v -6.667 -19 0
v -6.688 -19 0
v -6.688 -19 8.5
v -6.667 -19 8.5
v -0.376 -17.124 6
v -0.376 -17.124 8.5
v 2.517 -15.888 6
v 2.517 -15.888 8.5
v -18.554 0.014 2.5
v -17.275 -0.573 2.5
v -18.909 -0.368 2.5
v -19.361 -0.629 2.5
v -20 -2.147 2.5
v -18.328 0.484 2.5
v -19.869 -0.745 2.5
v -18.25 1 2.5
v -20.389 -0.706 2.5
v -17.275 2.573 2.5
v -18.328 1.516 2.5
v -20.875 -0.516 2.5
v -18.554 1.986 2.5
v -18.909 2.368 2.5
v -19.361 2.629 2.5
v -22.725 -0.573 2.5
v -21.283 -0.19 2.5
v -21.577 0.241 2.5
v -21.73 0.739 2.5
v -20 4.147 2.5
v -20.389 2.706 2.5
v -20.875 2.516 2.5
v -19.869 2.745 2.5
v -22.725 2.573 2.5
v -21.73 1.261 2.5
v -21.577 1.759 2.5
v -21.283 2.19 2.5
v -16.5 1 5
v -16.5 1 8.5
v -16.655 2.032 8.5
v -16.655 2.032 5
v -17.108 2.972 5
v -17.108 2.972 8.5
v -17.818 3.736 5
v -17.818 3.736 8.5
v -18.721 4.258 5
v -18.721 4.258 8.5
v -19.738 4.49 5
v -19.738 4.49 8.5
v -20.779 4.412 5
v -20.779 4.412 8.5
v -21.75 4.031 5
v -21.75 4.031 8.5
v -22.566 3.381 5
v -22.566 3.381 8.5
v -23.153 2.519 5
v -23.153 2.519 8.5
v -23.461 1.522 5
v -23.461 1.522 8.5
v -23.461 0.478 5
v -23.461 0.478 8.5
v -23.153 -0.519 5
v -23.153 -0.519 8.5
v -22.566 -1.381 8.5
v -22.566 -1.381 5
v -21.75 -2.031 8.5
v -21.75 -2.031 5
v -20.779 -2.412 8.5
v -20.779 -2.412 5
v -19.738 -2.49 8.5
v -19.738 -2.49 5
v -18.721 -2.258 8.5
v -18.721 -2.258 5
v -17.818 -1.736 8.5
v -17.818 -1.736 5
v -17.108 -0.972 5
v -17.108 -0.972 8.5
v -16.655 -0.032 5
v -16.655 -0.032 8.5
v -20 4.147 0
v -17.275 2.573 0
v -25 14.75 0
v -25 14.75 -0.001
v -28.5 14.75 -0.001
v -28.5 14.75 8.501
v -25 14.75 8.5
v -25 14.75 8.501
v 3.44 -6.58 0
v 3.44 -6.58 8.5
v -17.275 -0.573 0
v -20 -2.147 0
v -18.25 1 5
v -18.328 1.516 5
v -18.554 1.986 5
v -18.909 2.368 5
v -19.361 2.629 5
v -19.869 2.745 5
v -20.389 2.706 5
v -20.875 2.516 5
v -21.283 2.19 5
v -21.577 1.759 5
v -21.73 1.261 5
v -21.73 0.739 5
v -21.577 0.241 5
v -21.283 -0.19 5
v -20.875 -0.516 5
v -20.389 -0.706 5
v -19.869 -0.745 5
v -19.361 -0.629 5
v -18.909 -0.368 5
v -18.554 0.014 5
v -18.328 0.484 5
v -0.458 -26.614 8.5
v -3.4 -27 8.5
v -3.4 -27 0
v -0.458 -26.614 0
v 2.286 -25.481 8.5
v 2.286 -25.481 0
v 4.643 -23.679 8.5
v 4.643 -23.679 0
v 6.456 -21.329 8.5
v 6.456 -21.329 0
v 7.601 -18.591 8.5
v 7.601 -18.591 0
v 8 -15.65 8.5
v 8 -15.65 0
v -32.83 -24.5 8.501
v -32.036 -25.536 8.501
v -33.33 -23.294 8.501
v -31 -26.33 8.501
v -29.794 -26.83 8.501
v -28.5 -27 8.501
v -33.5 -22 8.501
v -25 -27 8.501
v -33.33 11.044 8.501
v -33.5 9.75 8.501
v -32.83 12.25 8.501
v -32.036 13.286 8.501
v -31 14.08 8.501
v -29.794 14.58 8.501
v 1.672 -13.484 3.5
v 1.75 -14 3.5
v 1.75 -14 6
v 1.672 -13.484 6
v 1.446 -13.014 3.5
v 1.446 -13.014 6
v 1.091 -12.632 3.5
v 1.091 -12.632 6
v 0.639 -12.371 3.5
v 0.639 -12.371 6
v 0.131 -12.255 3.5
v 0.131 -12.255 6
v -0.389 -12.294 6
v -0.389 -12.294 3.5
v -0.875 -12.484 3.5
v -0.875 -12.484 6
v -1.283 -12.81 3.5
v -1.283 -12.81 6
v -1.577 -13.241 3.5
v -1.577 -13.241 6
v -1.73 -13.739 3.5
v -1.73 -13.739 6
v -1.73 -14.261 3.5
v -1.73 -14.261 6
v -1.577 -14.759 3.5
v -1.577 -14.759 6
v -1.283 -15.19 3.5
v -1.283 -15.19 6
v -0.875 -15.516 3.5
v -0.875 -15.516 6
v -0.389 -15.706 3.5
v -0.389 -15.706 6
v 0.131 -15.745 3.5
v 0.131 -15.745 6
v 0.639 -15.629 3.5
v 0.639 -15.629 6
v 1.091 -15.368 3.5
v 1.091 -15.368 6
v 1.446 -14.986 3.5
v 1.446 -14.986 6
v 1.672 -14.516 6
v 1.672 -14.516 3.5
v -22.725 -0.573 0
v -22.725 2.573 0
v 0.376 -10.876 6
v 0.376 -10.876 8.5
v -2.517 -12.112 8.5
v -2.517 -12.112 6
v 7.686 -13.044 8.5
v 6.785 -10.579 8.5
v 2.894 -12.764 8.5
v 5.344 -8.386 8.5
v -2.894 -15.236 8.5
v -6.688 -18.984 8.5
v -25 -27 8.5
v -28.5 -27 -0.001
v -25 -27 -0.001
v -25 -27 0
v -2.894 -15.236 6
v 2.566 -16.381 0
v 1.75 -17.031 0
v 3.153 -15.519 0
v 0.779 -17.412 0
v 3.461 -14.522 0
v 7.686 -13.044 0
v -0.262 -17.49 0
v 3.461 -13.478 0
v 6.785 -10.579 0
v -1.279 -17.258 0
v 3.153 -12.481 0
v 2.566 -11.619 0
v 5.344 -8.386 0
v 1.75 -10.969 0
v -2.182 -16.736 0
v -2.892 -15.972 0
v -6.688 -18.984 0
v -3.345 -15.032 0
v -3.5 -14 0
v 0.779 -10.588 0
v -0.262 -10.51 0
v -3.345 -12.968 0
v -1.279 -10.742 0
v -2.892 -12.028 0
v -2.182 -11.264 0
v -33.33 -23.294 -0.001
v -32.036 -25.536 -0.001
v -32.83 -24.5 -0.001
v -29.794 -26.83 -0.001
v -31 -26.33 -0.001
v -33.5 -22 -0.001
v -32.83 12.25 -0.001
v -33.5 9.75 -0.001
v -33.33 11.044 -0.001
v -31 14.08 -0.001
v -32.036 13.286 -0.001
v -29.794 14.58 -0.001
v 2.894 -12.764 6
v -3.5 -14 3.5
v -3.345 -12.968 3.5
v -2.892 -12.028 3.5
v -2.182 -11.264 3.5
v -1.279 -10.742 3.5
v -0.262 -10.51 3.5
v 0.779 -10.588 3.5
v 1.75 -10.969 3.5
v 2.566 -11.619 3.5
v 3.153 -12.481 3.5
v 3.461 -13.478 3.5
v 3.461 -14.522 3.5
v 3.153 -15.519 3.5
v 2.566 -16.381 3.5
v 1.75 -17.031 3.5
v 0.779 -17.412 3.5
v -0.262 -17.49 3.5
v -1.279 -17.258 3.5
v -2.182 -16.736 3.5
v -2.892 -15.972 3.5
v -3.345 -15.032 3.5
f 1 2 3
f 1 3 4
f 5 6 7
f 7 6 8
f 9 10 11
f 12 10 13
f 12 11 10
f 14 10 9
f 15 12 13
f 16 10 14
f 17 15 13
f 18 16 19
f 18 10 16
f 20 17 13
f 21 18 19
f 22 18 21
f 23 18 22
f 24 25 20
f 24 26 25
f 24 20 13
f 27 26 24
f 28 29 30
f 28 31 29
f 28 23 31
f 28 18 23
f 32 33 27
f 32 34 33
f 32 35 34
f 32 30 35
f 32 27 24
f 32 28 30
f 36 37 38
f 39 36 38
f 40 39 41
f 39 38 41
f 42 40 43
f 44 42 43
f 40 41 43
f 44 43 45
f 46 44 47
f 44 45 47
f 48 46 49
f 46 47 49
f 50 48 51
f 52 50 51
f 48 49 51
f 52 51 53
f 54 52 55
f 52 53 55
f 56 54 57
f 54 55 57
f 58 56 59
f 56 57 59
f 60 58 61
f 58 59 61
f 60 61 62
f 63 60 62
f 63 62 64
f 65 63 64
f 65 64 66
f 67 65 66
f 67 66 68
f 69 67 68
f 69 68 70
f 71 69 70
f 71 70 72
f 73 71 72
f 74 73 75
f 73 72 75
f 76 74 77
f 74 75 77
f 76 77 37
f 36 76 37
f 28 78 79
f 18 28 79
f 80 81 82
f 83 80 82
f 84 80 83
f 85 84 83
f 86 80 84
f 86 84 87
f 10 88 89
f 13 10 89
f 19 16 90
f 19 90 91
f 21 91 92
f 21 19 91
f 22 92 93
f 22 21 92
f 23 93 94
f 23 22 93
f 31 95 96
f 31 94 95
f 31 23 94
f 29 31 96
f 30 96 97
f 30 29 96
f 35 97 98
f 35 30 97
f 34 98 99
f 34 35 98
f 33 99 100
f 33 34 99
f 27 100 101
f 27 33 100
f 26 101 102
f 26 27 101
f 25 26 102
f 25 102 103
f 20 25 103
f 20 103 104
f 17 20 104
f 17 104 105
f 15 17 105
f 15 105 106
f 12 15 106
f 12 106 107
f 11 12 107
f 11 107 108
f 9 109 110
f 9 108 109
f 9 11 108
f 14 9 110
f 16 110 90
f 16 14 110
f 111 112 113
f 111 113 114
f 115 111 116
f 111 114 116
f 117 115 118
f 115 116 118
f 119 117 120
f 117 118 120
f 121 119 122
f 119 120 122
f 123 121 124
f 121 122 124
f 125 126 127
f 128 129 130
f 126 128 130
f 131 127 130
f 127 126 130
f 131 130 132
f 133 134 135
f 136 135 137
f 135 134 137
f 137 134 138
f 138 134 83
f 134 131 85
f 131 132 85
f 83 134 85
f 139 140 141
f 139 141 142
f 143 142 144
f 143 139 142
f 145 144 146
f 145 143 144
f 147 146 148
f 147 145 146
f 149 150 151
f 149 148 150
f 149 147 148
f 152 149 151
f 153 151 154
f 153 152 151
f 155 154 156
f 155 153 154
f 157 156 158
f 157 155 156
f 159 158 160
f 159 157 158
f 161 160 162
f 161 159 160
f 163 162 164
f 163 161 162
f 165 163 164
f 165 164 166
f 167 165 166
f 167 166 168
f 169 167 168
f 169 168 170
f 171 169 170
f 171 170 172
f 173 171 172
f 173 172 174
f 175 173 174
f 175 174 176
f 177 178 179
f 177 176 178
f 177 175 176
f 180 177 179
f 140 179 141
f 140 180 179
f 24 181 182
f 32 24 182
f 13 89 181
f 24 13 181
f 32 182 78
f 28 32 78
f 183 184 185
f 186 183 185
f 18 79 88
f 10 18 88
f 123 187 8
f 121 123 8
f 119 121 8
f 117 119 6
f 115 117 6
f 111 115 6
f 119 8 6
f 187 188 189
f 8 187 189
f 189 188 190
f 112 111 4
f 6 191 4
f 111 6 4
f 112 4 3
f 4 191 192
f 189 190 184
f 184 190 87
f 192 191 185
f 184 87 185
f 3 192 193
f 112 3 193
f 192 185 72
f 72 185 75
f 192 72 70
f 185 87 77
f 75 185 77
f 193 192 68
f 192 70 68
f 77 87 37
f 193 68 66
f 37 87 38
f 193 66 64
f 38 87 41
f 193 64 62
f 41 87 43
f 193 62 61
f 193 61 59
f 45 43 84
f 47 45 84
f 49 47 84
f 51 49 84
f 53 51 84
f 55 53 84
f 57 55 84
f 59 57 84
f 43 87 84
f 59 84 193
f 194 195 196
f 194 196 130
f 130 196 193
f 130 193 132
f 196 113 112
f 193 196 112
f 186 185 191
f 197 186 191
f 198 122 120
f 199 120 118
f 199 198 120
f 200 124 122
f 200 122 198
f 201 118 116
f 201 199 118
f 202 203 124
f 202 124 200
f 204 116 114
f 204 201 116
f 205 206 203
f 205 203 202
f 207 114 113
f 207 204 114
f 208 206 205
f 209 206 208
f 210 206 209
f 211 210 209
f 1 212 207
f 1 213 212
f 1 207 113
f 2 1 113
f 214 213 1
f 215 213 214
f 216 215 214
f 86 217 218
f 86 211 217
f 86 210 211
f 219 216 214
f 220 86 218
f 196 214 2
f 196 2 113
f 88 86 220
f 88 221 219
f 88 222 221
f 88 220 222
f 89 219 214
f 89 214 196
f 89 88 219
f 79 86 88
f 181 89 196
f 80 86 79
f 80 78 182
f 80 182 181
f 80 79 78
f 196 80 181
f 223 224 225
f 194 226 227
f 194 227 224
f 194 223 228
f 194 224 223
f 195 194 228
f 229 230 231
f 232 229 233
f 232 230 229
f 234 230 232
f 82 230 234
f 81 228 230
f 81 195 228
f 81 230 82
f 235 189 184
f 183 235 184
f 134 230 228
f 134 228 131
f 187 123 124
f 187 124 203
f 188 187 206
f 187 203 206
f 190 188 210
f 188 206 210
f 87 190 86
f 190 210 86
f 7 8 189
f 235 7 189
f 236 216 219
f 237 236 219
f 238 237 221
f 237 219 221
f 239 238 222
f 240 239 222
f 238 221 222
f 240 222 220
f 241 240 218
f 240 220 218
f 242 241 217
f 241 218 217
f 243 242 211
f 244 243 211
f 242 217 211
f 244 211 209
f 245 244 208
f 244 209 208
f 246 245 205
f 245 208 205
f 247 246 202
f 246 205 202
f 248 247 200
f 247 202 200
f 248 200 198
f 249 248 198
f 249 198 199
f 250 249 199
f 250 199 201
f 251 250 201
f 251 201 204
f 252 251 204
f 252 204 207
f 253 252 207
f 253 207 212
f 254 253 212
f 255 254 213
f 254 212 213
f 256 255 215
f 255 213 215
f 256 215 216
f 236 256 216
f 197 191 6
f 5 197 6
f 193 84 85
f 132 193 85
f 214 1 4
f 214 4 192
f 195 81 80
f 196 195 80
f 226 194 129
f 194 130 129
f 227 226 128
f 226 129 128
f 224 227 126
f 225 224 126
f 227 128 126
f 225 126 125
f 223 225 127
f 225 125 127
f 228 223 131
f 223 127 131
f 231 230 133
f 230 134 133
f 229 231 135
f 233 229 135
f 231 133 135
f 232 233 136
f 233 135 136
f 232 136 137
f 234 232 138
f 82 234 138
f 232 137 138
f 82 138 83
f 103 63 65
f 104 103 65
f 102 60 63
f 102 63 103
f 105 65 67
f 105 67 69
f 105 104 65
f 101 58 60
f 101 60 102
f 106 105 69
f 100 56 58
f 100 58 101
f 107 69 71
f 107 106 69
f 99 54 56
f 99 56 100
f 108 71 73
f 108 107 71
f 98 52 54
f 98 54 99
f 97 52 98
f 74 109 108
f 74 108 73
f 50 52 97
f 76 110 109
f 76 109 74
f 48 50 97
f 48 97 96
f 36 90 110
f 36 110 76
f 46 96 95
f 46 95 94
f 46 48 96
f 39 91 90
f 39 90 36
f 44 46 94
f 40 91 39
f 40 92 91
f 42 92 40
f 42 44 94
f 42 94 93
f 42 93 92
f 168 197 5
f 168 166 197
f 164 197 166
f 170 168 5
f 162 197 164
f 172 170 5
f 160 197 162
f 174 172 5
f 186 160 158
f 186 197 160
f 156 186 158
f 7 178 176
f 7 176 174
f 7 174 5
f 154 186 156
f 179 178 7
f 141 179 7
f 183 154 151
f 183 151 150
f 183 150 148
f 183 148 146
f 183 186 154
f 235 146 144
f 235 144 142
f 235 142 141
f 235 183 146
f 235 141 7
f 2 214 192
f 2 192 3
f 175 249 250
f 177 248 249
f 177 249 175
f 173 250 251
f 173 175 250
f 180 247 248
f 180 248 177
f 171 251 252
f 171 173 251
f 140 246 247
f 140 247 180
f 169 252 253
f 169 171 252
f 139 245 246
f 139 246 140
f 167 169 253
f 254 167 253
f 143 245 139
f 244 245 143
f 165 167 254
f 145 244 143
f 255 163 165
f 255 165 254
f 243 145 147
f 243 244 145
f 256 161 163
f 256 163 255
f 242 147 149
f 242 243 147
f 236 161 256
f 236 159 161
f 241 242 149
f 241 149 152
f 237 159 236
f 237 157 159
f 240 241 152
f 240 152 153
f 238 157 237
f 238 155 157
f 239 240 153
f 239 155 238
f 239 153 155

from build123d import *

# Parameters (mm, degrees)
SKETCH1_R           = 1.75
BOSS_EXTRUDE1_DEPTH = 8.5
CUT_EXTRUDE2_DEPTH  = 2.5
CUT_EXTRUDE3_DEPTH  = 2.5
SKETCH5_R           = 3.5
CUT_EXTRUDE4_DEPTH  = 3.5
SKETCH6_R           = 3.5
CUT_EXTRUDE5_DEPTH  = 3.5
FILLET1_R           = 11.4
SKETCH7_W           = 8.501662988
SKETCH7_H           = 41.75
BOSS_EXTRUDE3_DEPTH = 8.5
FILLET2_R           = 5
FILLET3_R           = 5


with BuildPart() as part:
    # Sketch1 → Boss-Extrude1 (new body)
    with BuildSketch(Plane.XY):
        Polygon((8, -10), (8, -27), (-25, -27), (-25, 14.75), align=None)
        with Locations((-20, 1)):
            Circle(SKETCH1_R, mode=Mode.SUBTRACT)
        with Locations((0, -14)):
            Circle(SKETCH1_R, mode=Mode.SUBTRACT)
        Polygon((-6.687894354, -19), (-6.666666667, -19), (-6.687894354, -18.984079234), align=None, mode=Mode.SUBTRACT)
    extrude(amount=BOSS_EXTRUDE1_DEPTH)

    # Sketch3 → Cut-Extrude2 (cut)
    with BuildSketch(Plane(origin=(0, 0, 0), x_dir=(-1, 0, 0), z_dir=(0, 0, -1))):
        Polygon((22.725, 2.573279484), (20, 4.146558967), (17.275, 2.573279484), (17.275, -0.573279484), (20, -2.146558967), (22.725, -0.573279484), align=None)
    extrude(amount=-CUT_EXTRUDE2_DEPTH, mode=Mode.SUBTRACT)

    # Sketch4 → Cut-Extrude3 (cut)
    with BuildSketch(Plane.XY.offset(8.5)):
        Polygon((-2.517247174, -12.11206462), (-2.893623587, -15.23603231), (-0.376376413, -17.12396769), (2.517247174, -15.88793538), (2.893623587, -12.76396769), (0.376376413, -10.87603231), align=None)
    extrude(amount=-CUT_EXTRUDE3_DEPTH, mode=Mode.SUBTRACT)

    # Sketch5 → Cut-Extrude4 (cut)
    with BuildSketch(Plane.XY.offset(8.5)):
        with Locations((-20, 1)):
            Circle(SKETCH5_R)
    extrude(amount=-CUT_EXTRUDE4_DEPTH, mode=Mode.SUBTRACT)

    # Sketch6 → Cut-Extrude5 (cut)
    with BuildSketch(Plane(origin=(0, 0, 0), x_dir=(-1, 0, 0), z_dir=(0, 0, -1))):
        with Locations((0, -14)):
            Circle(SKETCH6_R)
    extrude(amount=-CUT_EXTRUDE5_DEPTH, mode=Mode.SUBTRACT)

    # Fillet1
    # the kernel refuses this fillet: 11.4 mm, written as the material it takes off along each edge
    with BuildSketch(Plane(origin=(8, -10, -14.25), x_dir=(0, -1, 0), z_dir=(0, 0, 1))) as fillet1_piece_1:
        with BuildLine():
            CenterArc((FILLET1_R * 0.5, -FILLET1_R), FILLET1_R, 90, 53.130102354)
            Line((-FILLET1_R * 0.3, -FILLET1_R * 0.4), (0, 0))
            Line((0, 0), (FILLET1_R * 0.5, 0))
        make_face()
    extrude(amount=37, mode=Mode.SUBTRACT)
    with BuildSketch(Plane(origin=(8, -27, -28.5), x_dir=(0, 1, 0), z_dir=(0, 0, 1))) as fillet1_piece_2:
        with BuildLine():
            CenterArc((FILLET1_R, FILLET1_R), FILLET1_R, 180, 90)
            Line((0, FILLET1_R), (0, 0))
            Line((0, 0), (FILLET1_R, 0))
        make_face()
    extrude(amount=65.5, mode=Mode.SUBTRACT)

    # Sketch7 → Boss-Extrude3 (add)
    with BuildSketch(Plane.ZY.offset(25)):
        with Locations((4.25, -6.125)):
            Rectangle(SKETCH7_W, SKETCH7_H)
    extrude(amount=BOSS_EXTRUDE3_DEPTH)

    # Fillet2
    fillet2_edges = [part.edges().sort_by_distance(p)[0] for p in [
        (-33.5, -27, 4.25),
    ]]
    fillet(fillet2_edges, radius=FILLET2_R)

    # Fillet3
    fillet3_edges = [part.edges().sort_by_distance(p)[0] for p in [
        (-33.5, 14.75, 4.25),
    ]]
    fillet(fillet3_edges, radius=FILLET3_R)


solid = part.part
